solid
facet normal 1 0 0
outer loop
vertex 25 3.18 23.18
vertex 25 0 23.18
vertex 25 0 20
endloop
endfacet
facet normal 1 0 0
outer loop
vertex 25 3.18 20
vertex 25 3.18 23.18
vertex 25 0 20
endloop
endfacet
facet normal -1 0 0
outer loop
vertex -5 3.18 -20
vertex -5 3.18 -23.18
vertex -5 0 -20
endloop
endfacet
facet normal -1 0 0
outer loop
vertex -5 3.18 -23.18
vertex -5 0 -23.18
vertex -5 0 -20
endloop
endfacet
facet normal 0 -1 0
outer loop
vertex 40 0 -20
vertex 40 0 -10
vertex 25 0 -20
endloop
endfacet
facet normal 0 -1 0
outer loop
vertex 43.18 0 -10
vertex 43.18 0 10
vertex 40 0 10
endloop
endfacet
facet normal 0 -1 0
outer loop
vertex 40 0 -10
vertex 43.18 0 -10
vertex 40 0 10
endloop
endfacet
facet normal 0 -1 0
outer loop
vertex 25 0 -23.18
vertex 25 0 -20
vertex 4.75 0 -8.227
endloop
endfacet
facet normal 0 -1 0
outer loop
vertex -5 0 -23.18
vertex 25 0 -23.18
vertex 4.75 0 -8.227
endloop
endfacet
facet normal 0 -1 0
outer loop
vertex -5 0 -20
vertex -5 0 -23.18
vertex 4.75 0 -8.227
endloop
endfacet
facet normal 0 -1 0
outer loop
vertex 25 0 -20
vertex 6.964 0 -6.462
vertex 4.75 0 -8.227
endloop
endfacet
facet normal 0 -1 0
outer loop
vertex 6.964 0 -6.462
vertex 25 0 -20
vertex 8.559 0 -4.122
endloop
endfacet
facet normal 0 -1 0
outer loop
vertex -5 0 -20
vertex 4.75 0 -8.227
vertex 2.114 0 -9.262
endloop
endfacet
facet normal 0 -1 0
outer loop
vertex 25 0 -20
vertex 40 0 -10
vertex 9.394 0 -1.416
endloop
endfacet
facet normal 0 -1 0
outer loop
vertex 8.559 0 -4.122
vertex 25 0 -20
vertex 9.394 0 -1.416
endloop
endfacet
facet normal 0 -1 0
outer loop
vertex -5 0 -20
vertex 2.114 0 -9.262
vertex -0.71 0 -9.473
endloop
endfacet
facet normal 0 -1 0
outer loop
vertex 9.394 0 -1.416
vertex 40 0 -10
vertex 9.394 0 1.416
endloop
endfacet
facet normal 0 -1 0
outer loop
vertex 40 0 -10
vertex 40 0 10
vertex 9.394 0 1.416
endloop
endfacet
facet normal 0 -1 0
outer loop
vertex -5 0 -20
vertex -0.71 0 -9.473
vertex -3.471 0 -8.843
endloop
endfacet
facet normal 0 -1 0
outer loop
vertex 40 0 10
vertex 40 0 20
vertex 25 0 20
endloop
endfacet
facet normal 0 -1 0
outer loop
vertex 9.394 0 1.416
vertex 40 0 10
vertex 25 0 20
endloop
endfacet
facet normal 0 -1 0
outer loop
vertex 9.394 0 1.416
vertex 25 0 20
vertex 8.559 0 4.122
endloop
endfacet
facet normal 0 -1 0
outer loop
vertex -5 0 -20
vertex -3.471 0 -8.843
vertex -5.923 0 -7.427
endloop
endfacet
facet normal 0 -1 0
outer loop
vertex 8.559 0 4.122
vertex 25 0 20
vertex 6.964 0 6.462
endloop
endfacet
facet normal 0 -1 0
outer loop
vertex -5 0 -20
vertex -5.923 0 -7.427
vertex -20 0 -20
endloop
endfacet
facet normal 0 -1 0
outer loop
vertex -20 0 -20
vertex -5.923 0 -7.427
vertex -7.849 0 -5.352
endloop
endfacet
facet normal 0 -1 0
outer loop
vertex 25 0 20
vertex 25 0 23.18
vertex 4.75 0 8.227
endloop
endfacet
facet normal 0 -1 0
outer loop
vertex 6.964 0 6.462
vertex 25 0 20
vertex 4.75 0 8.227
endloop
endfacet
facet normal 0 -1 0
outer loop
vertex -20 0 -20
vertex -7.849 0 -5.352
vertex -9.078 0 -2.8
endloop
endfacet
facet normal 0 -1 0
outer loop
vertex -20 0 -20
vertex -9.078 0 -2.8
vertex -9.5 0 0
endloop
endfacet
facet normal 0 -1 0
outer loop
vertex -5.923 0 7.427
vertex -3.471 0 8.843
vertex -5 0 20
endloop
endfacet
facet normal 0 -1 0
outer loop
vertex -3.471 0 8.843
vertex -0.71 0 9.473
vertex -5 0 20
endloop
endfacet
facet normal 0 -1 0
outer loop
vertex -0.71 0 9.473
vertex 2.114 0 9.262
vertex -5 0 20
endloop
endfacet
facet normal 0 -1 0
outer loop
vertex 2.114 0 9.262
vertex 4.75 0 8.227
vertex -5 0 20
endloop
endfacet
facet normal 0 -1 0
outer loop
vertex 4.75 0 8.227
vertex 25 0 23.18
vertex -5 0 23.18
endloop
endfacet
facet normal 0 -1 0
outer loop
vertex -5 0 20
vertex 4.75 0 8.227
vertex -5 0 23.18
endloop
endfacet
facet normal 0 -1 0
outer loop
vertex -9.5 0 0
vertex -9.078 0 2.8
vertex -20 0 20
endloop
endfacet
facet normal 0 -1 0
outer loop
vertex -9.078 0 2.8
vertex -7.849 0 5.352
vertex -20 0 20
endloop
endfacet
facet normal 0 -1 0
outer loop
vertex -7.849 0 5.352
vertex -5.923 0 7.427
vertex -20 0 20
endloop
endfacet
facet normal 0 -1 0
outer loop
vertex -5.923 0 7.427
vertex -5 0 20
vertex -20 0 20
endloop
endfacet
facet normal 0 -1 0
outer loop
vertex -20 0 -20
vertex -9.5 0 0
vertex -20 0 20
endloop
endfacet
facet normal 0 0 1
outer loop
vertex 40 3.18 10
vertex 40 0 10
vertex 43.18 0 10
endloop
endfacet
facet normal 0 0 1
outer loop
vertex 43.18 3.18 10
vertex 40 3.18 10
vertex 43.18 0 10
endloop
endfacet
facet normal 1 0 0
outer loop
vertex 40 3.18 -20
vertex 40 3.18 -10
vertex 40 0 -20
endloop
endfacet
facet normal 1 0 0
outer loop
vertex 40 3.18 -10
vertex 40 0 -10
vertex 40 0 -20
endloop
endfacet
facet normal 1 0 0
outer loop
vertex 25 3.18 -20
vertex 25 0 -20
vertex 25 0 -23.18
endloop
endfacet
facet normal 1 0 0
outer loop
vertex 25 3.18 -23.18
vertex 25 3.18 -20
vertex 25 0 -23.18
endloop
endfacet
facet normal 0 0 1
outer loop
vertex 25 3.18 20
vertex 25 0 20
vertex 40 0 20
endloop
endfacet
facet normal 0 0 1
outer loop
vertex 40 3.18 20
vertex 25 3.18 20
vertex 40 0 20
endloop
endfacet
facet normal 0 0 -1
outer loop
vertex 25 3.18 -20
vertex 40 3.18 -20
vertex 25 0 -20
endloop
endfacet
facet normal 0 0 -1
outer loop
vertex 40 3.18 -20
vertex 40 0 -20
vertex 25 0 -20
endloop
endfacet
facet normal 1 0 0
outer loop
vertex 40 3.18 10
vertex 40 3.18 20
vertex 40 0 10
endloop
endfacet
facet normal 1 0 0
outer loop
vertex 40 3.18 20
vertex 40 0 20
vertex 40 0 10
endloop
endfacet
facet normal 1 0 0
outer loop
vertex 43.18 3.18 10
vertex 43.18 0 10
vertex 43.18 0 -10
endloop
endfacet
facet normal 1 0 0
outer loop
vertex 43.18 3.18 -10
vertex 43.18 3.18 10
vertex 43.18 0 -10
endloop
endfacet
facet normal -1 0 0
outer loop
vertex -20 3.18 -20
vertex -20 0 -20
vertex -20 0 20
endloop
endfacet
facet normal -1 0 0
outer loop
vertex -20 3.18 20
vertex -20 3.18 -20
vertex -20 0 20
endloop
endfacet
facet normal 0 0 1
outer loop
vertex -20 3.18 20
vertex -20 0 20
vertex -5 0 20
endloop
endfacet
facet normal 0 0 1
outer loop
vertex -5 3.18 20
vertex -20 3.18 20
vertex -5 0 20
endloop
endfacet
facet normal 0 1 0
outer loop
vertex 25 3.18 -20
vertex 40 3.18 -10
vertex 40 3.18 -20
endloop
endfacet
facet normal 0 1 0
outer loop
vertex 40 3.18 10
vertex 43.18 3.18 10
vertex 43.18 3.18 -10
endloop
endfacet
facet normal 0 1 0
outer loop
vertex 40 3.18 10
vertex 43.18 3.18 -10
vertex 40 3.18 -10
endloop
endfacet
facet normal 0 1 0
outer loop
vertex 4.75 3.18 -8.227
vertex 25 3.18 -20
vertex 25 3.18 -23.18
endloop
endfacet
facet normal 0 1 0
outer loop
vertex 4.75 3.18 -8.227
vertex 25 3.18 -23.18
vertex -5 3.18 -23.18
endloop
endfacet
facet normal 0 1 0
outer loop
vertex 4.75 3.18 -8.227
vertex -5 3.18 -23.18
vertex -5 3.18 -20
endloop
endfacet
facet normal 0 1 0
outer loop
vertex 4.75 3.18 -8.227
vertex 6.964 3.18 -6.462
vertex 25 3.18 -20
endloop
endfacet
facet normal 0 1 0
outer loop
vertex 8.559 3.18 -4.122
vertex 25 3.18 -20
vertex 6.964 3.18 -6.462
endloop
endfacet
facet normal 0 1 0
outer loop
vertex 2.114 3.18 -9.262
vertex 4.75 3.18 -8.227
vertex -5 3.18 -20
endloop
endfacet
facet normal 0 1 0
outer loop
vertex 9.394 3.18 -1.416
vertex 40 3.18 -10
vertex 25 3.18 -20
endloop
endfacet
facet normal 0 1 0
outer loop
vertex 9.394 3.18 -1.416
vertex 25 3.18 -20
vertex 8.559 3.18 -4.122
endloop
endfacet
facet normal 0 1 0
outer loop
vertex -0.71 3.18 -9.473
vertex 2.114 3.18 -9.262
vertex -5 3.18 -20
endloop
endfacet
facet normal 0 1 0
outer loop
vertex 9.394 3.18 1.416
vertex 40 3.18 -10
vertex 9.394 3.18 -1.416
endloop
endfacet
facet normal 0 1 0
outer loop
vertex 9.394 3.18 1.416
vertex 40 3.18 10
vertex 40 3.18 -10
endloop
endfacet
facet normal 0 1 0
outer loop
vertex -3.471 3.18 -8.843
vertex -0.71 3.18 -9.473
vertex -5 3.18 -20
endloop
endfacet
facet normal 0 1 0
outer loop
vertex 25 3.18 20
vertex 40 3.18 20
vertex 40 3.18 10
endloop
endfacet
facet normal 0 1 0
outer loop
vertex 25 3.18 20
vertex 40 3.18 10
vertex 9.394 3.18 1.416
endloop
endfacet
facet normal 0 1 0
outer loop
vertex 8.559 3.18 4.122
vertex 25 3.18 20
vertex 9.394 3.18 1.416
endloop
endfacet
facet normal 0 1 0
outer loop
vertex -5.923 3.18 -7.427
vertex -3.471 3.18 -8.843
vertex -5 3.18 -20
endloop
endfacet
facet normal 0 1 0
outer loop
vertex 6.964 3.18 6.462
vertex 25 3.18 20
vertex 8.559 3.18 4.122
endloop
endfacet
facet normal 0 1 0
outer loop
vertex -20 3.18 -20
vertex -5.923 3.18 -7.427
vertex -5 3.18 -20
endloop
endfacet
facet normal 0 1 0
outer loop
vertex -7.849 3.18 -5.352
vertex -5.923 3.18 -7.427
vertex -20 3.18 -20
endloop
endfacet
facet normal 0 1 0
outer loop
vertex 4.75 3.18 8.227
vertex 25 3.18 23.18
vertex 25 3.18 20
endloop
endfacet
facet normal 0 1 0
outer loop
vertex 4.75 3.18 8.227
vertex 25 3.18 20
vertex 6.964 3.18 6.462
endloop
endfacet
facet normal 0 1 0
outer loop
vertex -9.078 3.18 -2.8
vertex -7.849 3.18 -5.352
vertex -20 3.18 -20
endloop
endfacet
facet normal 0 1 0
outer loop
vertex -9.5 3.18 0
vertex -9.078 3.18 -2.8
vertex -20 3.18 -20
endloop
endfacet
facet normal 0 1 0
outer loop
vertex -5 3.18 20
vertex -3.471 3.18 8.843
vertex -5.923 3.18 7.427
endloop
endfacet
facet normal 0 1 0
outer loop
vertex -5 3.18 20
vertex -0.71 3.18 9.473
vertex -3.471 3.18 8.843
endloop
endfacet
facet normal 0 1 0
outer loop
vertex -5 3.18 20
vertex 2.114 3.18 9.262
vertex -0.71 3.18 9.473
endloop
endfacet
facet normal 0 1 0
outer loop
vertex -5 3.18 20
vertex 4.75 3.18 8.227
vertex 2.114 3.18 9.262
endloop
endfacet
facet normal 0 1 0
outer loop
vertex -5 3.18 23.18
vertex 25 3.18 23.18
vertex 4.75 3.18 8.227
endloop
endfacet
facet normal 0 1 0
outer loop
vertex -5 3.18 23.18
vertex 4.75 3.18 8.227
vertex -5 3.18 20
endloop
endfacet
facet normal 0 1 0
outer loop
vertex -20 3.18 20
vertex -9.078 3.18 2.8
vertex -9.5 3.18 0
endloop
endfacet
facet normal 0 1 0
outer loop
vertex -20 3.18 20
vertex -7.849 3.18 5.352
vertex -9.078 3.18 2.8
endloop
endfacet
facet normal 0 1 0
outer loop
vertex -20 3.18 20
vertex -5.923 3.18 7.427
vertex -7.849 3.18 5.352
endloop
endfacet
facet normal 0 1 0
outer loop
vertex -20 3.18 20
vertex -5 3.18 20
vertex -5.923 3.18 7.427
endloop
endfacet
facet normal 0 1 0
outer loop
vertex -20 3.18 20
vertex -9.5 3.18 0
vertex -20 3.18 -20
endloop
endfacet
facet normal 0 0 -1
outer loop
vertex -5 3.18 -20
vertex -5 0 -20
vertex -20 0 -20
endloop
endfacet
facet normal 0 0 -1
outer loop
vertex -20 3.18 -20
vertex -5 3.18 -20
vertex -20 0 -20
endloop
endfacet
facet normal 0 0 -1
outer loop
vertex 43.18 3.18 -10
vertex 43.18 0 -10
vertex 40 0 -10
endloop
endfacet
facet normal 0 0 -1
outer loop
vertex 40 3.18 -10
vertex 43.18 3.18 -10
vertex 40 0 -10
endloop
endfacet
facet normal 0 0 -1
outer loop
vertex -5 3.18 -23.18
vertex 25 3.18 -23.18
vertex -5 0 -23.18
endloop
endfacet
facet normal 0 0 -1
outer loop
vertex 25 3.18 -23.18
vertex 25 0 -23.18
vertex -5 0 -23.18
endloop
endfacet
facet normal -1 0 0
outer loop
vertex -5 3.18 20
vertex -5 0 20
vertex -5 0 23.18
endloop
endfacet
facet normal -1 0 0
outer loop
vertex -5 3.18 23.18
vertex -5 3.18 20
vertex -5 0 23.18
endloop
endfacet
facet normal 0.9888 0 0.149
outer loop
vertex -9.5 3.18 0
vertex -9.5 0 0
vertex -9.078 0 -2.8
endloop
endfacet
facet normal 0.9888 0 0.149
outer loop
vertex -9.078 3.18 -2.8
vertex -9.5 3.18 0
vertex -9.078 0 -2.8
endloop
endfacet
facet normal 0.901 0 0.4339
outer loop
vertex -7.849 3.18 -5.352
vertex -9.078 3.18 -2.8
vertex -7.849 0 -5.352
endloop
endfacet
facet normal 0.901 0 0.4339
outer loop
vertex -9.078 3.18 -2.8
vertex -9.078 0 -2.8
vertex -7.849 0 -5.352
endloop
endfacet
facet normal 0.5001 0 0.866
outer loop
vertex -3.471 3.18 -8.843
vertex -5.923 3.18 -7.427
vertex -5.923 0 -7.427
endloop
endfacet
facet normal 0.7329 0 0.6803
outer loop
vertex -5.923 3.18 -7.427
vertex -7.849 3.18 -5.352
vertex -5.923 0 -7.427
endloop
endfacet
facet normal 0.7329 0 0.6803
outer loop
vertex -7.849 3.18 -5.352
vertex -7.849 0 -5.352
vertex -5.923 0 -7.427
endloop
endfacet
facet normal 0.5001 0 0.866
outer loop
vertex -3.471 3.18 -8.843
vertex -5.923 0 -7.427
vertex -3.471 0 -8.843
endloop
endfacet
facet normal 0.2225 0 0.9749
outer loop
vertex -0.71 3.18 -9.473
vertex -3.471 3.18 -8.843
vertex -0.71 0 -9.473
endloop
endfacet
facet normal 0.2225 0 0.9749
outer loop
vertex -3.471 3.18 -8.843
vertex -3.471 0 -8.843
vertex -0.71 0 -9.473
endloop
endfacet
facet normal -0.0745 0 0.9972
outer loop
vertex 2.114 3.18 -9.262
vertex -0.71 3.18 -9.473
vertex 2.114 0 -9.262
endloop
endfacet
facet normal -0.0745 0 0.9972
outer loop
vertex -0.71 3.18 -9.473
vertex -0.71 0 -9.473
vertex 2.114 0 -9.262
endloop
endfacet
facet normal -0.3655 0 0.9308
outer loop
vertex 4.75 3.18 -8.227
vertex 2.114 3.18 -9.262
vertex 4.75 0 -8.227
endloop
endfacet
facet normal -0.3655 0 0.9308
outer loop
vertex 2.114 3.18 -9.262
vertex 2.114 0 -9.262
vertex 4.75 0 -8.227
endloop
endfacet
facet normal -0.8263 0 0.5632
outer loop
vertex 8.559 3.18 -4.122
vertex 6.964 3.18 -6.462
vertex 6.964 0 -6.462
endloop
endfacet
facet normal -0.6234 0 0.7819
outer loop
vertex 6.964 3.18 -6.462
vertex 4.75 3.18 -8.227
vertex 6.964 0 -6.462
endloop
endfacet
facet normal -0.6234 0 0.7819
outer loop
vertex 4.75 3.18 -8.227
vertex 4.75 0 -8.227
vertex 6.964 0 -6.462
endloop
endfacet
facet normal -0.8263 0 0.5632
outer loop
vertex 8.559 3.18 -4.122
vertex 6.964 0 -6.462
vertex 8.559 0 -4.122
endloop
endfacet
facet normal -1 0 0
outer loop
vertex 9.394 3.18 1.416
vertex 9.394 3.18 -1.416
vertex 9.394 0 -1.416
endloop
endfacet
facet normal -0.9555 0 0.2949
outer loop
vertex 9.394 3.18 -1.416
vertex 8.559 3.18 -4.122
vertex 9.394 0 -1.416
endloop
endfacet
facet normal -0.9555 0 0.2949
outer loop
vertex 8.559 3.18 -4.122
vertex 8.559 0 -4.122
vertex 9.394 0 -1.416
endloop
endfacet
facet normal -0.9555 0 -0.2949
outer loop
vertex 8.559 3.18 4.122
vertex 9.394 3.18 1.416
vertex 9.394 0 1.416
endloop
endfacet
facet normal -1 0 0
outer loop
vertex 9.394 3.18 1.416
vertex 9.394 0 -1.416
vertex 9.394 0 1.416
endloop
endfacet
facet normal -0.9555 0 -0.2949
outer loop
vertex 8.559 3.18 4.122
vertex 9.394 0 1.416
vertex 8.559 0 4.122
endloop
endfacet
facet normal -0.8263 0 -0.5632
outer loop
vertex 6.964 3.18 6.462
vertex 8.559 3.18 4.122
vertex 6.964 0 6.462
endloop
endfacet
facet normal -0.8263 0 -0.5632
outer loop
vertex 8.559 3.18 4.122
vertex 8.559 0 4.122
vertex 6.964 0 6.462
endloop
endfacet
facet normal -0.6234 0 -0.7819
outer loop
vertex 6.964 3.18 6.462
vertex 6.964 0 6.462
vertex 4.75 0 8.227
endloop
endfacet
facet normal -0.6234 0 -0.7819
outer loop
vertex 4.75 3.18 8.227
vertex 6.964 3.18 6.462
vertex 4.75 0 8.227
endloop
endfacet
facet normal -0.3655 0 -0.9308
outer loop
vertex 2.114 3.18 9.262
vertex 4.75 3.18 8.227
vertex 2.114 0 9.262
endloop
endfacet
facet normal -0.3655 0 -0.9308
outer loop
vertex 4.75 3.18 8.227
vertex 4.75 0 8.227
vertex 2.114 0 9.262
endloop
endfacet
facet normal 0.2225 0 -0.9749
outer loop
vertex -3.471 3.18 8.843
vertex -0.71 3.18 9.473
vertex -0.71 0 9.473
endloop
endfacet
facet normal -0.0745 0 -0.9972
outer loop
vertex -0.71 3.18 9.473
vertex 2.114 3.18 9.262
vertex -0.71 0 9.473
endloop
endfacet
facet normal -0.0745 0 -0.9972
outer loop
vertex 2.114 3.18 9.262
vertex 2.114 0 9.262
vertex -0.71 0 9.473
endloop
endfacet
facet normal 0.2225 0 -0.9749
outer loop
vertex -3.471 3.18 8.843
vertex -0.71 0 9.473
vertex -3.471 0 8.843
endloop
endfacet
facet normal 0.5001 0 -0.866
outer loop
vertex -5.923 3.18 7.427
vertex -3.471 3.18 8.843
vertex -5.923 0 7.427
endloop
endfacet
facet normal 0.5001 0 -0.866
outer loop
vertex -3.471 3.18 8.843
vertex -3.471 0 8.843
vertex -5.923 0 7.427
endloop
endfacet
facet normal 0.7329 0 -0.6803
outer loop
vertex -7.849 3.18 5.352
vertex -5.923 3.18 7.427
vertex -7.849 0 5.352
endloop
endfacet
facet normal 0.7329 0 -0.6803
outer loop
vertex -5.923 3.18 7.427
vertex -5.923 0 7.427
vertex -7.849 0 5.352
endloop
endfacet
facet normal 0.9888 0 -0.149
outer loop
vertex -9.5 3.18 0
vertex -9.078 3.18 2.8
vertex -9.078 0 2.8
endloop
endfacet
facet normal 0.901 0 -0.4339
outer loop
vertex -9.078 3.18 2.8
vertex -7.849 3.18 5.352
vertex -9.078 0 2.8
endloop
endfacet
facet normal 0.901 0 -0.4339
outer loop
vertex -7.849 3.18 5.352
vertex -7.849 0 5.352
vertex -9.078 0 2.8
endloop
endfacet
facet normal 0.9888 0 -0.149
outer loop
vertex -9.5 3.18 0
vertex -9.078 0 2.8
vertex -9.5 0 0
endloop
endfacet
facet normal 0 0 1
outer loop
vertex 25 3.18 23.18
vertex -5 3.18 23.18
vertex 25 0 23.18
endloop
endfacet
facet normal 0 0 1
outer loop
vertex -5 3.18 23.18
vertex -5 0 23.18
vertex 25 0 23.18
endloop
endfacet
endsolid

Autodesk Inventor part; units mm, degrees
ref_plane "YZ Plane" through (0, 0, 0) normal (1, 0, 0) x (0, 1, 0)
ref_plane "XZ Plane" through (0, 0, 0) normal (0, 1, 0) x (-1, 0, 0)
ref_plane "XY Plane" through (0, 0, 0) normal (0, 0, 1) x (1, 0, 0)
sketch "Boceto1" plane through (0, 0, 0) normal (0, 1, 0) x (-1, 0, 0)
  circle A0 centre (0, 0) radius 9.5
  line L0 (20, 20) -> (-40, 20)
  line L1 (-40, 20) -> (-40, -20)
  line L2 (-40, -20) -> (20, -20)
  line L3 (20, -20) -> (20, 20)
  line L4 (5, 23.18) -> (-25, 23.18)
  line L5 (-25, 23.18) -> (-25, 20)
  line L6 (-25, 20) -> (5, 20)
  line L7 (5, 20) -> (5, 23.18)
  line L8 (5, -20) -> (-25, -20)
  line L9 (-25, -20) -> (-25, -23.18)
  line L10 (-25, -23.18) -> (5, -23.18)
  line L11 (5, -23.18) -> (5, -20)
  line L12 (-40, 10) -> (-43.18, 10)
  line L13 (-43.18, 10) -> (-43.18, -10)
  line L14 (-43.18, -10) -> (-40, -10)
  line L15 (-40, -10) -> (-40, 10)
  dimension "d0" = 19
  dimension "d17" = 40
  dimension "d18" = 60
  dimension "d19" = 20
  dimension "d20" = 20
  dimension "d21" = 3.18
  dimension "d22" = 30
  dimension "d23" = 15
  dimension "d24" = 20
  dimension "d25" = 10
  dimension "d26" = 3.18
extrude "Extrusión1" add sketch "Boceto1" along normal blind 3.18
properties part number "HOMBRO_SOST.COJ"
